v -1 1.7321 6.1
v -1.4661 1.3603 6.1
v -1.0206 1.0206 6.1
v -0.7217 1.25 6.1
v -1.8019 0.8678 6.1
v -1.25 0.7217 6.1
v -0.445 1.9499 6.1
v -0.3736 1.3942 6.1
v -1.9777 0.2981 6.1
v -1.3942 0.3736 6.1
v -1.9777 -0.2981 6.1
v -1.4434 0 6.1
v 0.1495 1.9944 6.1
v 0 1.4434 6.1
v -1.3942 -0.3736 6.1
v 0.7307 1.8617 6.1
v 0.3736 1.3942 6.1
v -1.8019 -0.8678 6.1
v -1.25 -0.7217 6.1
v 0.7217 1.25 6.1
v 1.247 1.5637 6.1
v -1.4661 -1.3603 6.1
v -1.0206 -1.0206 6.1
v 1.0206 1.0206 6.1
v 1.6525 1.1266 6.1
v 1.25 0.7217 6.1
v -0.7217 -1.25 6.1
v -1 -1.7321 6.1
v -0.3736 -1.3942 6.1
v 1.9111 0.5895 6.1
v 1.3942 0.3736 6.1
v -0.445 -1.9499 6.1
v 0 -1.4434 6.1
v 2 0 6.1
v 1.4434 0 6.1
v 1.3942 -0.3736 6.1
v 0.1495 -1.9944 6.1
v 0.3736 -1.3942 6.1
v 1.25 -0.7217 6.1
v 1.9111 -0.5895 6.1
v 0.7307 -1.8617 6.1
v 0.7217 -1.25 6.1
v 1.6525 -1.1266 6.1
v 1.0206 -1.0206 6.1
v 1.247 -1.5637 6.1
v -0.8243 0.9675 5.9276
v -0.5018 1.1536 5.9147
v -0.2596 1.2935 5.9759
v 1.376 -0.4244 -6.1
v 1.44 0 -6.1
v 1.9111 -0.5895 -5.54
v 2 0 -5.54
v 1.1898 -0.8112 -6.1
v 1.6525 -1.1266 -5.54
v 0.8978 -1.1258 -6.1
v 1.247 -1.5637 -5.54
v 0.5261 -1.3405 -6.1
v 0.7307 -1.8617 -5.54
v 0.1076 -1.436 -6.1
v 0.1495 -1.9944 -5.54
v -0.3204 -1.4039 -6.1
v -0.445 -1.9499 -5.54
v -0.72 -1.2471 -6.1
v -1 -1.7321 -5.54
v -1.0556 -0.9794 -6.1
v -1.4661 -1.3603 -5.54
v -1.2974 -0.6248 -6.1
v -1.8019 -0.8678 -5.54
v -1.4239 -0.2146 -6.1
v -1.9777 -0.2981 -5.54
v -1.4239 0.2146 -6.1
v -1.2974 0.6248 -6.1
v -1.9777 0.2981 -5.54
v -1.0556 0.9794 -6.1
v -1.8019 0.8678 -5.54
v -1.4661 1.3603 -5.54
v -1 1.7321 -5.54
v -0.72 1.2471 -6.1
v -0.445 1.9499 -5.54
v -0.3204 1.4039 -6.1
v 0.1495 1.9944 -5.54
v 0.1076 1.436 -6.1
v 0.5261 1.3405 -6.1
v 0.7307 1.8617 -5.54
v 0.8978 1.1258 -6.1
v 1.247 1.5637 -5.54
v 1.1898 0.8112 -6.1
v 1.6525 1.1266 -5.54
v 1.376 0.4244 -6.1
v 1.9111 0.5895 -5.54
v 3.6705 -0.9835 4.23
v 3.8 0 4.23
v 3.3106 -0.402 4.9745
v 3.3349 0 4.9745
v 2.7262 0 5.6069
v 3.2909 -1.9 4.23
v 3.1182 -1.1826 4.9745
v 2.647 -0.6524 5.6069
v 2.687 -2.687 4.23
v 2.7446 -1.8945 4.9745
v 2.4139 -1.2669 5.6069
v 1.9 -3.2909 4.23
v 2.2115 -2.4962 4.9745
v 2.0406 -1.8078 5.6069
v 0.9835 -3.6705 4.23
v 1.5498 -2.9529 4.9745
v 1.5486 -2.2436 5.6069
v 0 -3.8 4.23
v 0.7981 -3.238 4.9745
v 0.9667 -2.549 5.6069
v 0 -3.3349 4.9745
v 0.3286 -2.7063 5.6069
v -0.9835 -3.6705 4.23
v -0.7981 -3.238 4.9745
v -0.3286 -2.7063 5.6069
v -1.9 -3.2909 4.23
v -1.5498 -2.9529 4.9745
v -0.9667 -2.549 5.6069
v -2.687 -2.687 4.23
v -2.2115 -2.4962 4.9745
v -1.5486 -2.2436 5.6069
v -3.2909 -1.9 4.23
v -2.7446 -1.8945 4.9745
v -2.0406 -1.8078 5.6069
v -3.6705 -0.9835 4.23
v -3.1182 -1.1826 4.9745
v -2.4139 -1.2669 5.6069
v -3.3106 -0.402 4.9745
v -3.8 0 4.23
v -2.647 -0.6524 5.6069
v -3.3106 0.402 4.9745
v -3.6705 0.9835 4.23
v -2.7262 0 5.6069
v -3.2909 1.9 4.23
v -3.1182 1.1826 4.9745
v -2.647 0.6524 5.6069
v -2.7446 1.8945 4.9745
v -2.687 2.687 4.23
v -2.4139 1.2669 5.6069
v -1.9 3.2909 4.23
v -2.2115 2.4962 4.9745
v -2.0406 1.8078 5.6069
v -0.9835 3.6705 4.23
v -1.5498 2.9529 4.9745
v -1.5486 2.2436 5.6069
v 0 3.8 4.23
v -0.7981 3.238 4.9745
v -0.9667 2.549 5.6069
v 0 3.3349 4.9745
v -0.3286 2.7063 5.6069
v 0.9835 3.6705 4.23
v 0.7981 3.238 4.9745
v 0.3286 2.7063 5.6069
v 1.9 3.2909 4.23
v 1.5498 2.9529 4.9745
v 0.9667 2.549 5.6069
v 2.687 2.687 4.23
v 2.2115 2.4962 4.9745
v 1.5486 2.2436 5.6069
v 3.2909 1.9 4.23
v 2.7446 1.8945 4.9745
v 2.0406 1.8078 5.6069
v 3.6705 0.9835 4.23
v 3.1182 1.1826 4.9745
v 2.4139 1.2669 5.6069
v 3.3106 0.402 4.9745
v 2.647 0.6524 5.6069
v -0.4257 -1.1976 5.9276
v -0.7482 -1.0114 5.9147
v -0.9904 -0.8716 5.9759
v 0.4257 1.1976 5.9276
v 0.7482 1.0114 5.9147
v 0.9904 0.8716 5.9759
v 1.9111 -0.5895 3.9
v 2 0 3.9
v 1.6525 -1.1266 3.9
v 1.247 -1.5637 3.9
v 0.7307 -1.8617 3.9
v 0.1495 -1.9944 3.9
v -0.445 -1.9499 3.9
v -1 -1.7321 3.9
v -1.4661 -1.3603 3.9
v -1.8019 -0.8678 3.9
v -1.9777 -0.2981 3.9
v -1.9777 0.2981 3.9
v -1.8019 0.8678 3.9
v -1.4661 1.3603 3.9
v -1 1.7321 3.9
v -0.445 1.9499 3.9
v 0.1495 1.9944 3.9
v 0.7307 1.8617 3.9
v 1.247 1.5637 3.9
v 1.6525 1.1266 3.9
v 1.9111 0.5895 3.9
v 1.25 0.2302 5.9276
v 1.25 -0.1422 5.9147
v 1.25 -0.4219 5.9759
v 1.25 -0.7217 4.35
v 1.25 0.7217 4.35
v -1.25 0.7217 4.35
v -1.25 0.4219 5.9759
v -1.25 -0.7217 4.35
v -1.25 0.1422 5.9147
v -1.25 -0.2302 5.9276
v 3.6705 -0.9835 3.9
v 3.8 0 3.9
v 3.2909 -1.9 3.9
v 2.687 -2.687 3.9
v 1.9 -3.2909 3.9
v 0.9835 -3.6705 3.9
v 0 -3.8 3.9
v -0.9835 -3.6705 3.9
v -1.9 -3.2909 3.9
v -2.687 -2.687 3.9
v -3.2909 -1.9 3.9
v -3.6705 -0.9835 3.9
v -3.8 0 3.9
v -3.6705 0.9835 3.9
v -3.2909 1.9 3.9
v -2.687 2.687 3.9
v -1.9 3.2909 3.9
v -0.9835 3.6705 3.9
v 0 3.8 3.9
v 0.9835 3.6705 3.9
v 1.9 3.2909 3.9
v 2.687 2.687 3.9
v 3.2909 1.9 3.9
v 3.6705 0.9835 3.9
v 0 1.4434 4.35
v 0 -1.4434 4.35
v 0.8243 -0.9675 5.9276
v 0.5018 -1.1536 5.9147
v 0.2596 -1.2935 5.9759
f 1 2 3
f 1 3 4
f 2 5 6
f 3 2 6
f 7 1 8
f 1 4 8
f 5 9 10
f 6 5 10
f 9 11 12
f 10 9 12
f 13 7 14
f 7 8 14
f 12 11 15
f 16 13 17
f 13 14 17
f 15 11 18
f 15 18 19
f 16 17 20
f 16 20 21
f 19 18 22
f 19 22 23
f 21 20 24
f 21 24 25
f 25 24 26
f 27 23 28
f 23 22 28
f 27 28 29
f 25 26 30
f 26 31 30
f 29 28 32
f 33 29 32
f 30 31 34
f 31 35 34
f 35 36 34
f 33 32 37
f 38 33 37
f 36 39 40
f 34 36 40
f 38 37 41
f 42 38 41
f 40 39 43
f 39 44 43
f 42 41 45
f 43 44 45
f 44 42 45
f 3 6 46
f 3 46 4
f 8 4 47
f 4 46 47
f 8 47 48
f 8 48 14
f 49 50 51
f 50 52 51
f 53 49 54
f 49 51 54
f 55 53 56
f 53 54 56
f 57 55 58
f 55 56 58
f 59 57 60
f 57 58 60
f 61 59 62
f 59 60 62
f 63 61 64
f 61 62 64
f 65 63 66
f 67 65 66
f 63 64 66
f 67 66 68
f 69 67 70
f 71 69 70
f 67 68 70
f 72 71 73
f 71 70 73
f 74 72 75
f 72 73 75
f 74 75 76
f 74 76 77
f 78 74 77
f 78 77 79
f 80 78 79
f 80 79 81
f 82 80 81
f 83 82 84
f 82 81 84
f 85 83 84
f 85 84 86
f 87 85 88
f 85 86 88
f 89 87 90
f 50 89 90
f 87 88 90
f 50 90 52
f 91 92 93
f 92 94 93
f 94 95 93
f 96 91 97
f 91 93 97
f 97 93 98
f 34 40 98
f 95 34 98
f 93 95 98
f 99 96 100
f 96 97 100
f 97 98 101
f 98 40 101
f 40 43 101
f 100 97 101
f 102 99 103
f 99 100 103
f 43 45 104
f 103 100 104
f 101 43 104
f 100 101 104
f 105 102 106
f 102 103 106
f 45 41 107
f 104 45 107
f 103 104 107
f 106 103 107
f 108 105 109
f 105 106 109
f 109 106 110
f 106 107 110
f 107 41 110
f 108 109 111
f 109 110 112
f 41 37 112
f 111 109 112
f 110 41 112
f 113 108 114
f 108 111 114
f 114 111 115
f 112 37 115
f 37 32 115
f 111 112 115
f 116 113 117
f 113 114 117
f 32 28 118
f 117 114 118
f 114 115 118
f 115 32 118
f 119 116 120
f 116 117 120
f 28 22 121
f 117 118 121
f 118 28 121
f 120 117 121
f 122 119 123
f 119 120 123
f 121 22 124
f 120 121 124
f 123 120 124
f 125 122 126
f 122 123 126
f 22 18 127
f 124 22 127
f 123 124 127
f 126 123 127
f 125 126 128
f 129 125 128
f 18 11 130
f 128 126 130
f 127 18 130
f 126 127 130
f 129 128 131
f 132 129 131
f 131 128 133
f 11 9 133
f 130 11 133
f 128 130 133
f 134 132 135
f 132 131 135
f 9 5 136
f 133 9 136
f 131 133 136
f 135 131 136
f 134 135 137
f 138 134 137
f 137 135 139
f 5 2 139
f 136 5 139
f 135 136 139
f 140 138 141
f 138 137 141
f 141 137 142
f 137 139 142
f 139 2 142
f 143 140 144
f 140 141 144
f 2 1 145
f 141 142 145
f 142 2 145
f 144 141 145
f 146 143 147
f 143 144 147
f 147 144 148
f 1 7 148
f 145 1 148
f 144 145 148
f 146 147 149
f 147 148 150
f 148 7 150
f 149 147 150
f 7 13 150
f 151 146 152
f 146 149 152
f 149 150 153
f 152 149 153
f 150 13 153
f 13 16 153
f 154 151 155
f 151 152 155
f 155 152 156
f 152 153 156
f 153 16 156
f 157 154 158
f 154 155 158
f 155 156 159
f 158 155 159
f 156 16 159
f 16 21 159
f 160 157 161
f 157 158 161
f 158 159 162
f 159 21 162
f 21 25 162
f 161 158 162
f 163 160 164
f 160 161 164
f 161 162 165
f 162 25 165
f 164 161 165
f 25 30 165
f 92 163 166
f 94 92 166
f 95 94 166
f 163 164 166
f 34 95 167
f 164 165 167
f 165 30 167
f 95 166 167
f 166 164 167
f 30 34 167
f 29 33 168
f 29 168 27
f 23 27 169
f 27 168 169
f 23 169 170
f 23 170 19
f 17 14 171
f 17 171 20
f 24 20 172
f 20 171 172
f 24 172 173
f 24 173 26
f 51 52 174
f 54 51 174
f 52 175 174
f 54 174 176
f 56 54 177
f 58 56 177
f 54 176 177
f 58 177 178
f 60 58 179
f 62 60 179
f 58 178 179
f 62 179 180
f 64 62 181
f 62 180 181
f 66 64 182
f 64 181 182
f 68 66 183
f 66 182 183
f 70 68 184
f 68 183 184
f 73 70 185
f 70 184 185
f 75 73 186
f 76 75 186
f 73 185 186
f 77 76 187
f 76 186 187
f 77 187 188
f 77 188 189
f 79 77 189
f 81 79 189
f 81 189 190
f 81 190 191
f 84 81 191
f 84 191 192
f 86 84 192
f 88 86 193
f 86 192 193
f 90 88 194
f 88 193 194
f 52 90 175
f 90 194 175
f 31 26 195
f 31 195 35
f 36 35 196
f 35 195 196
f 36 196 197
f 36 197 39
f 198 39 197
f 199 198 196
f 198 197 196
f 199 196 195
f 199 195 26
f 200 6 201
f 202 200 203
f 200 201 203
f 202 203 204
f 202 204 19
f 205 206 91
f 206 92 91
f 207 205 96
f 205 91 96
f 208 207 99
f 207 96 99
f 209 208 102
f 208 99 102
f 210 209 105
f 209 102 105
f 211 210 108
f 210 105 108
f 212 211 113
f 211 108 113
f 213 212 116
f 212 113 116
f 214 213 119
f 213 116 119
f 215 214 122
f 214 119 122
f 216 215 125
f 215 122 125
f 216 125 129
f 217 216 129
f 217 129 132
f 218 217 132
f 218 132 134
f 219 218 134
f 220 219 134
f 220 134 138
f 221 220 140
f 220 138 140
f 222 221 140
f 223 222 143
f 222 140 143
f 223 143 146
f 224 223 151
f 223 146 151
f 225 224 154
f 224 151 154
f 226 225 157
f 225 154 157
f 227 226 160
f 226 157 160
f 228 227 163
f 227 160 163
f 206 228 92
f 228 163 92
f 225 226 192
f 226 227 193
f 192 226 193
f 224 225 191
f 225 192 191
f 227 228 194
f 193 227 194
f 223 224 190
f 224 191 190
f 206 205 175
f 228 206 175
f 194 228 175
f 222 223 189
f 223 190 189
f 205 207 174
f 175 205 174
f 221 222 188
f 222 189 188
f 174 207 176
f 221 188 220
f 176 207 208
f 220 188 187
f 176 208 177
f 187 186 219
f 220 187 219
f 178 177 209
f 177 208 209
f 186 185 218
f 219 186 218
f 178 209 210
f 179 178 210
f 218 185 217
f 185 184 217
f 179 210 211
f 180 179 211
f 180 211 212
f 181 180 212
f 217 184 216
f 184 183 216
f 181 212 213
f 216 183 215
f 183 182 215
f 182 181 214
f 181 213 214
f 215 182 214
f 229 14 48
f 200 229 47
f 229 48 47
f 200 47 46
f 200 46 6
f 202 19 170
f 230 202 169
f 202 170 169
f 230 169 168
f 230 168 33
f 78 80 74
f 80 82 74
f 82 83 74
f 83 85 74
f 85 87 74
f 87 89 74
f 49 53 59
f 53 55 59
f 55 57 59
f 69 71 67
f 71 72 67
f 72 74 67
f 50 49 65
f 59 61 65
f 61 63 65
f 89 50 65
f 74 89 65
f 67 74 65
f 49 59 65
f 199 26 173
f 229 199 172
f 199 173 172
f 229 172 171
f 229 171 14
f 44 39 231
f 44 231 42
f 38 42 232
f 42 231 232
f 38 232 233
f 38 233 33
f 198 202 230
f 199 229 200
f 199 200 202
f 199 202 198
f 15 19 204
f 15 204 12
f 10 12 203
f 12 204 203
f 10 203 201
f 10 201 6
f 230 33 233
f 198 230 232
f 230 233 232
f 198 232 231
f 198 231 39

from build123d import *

# Parameters (mm, degrees)
CUT_EXTRUDE1_DEPTH = 1.75


with BuildPart() as part:
    # Sketch2 → Revolve1 (revolve)
    with BuildSketch(Plane(origin=(0, 0, 0), x_dir=(0, 0, -1), z_dir=(1, 0, 0)), mode=Mode.PRIVATE) as revolve1_sk:
        with BuildLine():
            Line((-6.1, 0), (6.1, 0))
            Line((6.1, 0), (6.1, 1.44))
            Line((6.1, 1.44), (5.54, 2))
            Line((5.54, 2), (-3.9, 2))
            Line((-3.9, 2), (-3.9, 3.8))
            Line((-3.9, 3.8), (-4.23, 3.8))
            ThreePointArc((-4.23, 3.8), (-5.306499853, 3.047002626), (-6.1, 2))
            Line((-6.1, 2), (-6.1, 0))
        make_face()
    revolve(revolve1_sk.sketch.rotate(Axis((0, 0, 6.1), (0, 0, -1)), 90), axis=Axis((0, 0, 6.1), (0, 0, -1)))

    # Sketch3 → Cut-Extrude1 (cut)
    with BuildSketch(Plane.XY.offset(6.1)):
        Polygon((0, 1.443375673), (-1.25, 0.721687836), (-1.25, -0.721687836), (0, -1.443375673), (1.25, -0.721687836), (1.25, 0.721687836), align=None)
    extrude(amount=-CUT_EXTRUDE1_DEPTH, mode=Mode.SUBTRACT)

    # Cut-Extrude2 cone 1 section (through the dimple's axis) → Cut-Extrude2 (revolve, cut)
    with BuildSketch(Plane(origin=(0, 0, 6.1), x_dir=(0, -1, 0), z_dir=(1, 0, 0))):
        Polygon((0, 0), (1.443375673, 0), (0, 1.443375673), align=None)
    revolve(axis=Axis((0, 0, 6.1), (0, 0, -1)), mode=Mode.SUBTRACT)


solid = part.part
